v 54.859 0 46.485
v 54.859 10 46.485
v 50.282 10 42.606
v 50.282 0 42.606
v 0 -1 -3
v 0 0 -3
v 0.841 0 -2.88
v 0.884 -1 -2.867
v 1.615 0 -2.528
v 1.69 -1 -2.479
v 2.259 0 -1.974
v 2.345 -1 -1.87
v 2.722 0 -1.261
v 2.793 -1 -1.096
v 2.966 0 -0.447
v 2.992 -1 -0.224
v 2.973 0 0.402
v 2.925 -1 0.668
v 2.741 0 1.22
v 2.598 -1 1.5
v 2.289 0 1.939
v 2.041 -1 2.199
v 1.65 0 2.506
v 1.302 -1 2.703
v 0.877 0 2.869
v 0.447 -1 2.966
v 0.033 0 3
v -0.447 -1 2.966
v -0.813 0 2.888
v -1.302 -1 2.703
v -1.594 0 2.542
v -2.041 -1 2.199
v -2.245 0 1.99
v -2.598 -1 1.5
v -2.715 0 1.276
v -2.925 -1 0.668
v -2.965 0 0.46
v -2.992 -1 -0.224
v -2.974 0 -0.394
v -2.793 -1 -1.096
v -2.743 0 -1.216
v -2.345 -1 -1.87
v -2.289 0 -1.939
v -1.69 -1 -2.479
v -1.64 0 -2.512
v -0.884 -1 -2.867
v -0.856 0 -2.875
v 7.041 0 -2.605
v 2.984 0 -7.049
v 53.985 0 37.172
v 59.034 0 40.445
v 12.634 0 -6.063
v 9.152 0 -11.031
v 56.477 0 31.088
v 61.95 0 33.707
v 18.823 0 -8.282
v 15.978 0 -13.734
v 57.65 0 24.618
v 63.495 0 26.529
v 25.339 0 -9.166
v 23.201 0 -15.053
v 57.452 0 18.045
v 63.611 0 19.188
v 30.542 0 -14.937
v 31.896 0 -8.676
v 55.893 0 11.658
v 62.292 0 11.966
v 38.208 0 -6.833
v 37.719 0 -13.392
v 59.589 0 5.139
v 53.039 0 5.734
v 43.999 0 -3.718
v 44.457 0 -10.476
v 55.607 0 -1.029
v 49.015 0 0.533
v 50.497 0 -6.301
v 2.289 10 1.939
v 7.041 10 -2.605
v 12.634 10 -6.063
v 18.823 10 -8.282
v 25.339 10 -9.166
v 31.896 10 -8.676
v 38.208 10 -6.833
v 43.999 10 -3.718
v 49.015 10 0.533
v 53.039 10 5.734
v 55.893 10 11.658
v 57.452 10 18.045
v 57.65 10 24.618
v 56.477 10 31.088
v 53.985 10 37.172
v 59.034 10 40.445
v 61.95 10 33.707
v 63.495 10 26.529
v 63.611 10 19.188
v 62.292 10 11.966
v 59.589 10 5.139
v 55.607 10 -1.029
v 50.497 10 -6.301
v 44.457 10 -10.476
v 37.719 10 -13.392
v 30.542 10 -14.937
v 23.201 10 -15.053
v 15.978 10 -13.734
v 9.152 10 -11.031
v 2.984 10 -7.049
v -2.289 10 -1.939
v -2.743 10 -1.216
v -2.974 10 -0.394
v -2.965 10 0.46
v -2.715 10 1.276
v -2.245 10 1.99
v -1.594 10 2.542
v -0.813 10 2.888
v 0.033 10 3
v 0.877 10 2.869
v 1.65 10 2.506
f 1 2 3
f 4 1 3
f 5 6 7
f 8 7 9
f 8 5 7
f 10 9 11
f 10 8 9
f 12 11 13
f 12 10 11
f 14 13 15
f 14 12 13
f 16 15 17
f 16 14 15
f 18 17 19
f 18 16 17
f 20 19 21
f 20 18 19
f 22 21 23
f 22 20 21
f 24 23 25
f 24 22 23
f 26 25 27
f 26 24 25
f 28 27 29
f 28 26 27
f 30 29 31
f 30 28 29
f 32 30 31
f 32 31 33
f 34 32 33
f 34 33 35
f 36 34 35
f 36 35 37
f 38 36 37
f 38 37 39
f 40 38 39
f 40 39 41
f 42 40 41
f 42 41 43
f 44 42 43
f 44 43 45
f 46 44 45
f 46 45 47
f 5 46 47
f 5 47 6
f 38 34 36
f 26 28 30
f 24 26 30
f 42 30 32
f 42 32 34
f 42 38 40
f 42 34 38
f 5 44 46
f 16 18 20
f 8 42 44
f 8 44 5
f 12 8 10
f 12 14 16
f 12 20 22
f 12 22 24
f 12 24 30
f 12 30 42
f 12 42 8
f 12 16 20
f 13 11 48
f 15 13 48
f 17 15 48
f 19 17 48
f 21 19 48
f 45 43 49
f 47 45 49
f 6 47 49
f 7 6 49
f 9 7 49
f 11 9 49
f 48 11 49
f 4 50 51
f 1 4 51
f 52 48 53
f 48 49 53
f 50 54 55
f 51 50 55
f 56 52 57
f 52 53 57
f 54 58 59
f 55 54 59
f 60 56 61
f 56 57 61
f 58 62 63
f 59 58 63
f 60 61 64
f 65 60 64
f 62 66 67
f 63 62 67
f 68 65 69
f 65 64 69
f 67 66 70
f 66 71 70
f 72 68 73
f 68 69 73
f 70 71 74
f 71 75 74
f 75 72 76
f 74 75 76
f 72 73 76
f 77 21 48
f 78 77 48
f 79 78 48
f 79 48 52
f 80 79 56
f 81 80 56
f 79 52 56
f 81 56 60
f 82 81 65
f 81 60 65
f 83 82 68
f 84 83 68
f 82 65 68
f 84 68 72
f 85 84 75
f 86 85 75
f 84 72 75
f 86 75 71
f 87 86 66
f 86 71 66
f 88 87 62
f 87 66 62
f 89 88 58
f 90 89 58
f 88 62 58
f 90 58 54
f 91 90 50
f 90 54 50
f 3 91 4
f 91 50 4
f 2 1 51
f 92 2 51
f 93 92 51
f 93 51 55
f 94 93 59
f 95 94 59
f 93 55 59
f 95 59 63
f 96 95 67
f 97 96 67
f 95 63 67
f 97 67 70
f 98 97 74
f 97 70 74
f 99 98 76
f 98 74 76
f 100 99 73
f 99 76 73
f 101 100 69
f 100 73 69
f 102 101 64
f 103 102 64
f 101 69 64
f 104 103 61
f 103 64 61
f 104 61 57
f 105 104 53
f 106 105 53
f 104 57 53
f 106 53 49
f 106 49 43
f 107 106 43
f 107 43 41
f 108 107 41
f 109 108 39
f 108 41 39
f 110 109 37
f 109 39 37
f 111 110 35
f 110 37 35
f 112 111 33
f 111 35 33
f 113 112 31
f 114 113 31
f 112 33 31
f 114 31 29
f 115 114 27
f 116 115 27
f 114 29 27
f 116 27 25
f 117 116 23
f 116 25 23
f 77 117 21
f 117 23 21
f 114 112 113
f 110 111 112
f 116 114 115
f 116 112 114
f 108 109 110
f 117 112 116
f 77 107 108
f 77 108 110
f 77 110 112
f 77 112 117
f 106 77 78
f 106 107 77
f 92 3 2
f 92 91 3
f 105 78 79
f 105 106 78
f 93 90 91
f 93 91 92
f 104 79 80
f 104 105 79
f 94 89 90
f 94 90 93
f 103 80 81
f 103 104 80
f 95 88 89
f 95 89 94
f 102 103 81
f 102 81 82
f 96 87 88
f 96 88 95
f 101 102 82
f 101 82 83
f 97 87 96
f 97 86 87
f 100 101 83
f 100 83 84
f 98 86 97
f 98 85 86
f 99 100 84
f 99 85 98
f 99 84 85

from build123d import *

# Parameters (mm, degrees)
BOSS_EXTRUDE1_DEPTH     = 10
BOSS_EXTRUDE2_START     = 1
SKETCH3_R               = 3
BOSS_EXTRUDE2_DEPTH     = 1
CUT_EXTRUDE1_DEPTH      = 59
CUT_EXTRUDE1_DEPTH_BACK = 104


with BuildPart() as part:
    # Sketch2 → Boss-Extrude1 (new body)
    with BuildSketch(Plane(origin=(0, 0, 0), x_dir=(1, 0, 0), z_dir=(0, 1, 0))):
        with BuildLine():
            ThreePointArc((54.859329632, -46.484559643), (50.497240278, 6.301499085), (-2.28881845, 1.939409731))
            ThreePointArc((-2.28881845, 1.939409731), (-1.939409731, -2.28881845), (2.28881845, -1.939409731))
            ThreePointArc((2.28881845, -1.939409731), (46.618420816, 1.723862186), (50.281692732, -42.605740181))
            ThreePointArc((50.281692732, -42.605740181), (50.631101451, -46.833968361), (54.859329632, -46.484559643))
        make_face()
    extrude(amount=BOSS_EXTRUDE1_DEPTH)

    # Sketch3 → Boss-Extrude2 (add)
    with BuildSketch(Plane.XZ.offset(BOSS_EXTRUDE2_START)):
        with Locations(Location((0, 0, 0), (0, 0, 270))):
            Circle(SKETCH3_R)
    extrude(amount=-BOSS_EXTRUDE2_DEPTH)

    # Sketch4 → Cut-Extrude1 (cut, two sides: drawn at the far end of the back side and taken through both)
    with BuildSketch(Plane.XZ.offset(-CUT_EXTRUDE1_DEPTH_BACK)):
        with BuildLine():
            Line((54.859329632, 46.484559643), (50.281692732, 42.605740181))
            ThreePointArc((50.281692732, 42.605740181), (49.580702363, 44.792219186), (50.631101451, 46.833968361))
            ThreePointArc((50.631101451, 46.833968361), (52.817580456, 47.534958731), (54.859329632, 46.484559643))
        make_face()
    extrude(amount=CUT_EXTRUDE1_DEPTH + CUT_EXTRUDE1_DEPTH_BACK, mode=Mode.SUBTRACT)


solid = part.part
